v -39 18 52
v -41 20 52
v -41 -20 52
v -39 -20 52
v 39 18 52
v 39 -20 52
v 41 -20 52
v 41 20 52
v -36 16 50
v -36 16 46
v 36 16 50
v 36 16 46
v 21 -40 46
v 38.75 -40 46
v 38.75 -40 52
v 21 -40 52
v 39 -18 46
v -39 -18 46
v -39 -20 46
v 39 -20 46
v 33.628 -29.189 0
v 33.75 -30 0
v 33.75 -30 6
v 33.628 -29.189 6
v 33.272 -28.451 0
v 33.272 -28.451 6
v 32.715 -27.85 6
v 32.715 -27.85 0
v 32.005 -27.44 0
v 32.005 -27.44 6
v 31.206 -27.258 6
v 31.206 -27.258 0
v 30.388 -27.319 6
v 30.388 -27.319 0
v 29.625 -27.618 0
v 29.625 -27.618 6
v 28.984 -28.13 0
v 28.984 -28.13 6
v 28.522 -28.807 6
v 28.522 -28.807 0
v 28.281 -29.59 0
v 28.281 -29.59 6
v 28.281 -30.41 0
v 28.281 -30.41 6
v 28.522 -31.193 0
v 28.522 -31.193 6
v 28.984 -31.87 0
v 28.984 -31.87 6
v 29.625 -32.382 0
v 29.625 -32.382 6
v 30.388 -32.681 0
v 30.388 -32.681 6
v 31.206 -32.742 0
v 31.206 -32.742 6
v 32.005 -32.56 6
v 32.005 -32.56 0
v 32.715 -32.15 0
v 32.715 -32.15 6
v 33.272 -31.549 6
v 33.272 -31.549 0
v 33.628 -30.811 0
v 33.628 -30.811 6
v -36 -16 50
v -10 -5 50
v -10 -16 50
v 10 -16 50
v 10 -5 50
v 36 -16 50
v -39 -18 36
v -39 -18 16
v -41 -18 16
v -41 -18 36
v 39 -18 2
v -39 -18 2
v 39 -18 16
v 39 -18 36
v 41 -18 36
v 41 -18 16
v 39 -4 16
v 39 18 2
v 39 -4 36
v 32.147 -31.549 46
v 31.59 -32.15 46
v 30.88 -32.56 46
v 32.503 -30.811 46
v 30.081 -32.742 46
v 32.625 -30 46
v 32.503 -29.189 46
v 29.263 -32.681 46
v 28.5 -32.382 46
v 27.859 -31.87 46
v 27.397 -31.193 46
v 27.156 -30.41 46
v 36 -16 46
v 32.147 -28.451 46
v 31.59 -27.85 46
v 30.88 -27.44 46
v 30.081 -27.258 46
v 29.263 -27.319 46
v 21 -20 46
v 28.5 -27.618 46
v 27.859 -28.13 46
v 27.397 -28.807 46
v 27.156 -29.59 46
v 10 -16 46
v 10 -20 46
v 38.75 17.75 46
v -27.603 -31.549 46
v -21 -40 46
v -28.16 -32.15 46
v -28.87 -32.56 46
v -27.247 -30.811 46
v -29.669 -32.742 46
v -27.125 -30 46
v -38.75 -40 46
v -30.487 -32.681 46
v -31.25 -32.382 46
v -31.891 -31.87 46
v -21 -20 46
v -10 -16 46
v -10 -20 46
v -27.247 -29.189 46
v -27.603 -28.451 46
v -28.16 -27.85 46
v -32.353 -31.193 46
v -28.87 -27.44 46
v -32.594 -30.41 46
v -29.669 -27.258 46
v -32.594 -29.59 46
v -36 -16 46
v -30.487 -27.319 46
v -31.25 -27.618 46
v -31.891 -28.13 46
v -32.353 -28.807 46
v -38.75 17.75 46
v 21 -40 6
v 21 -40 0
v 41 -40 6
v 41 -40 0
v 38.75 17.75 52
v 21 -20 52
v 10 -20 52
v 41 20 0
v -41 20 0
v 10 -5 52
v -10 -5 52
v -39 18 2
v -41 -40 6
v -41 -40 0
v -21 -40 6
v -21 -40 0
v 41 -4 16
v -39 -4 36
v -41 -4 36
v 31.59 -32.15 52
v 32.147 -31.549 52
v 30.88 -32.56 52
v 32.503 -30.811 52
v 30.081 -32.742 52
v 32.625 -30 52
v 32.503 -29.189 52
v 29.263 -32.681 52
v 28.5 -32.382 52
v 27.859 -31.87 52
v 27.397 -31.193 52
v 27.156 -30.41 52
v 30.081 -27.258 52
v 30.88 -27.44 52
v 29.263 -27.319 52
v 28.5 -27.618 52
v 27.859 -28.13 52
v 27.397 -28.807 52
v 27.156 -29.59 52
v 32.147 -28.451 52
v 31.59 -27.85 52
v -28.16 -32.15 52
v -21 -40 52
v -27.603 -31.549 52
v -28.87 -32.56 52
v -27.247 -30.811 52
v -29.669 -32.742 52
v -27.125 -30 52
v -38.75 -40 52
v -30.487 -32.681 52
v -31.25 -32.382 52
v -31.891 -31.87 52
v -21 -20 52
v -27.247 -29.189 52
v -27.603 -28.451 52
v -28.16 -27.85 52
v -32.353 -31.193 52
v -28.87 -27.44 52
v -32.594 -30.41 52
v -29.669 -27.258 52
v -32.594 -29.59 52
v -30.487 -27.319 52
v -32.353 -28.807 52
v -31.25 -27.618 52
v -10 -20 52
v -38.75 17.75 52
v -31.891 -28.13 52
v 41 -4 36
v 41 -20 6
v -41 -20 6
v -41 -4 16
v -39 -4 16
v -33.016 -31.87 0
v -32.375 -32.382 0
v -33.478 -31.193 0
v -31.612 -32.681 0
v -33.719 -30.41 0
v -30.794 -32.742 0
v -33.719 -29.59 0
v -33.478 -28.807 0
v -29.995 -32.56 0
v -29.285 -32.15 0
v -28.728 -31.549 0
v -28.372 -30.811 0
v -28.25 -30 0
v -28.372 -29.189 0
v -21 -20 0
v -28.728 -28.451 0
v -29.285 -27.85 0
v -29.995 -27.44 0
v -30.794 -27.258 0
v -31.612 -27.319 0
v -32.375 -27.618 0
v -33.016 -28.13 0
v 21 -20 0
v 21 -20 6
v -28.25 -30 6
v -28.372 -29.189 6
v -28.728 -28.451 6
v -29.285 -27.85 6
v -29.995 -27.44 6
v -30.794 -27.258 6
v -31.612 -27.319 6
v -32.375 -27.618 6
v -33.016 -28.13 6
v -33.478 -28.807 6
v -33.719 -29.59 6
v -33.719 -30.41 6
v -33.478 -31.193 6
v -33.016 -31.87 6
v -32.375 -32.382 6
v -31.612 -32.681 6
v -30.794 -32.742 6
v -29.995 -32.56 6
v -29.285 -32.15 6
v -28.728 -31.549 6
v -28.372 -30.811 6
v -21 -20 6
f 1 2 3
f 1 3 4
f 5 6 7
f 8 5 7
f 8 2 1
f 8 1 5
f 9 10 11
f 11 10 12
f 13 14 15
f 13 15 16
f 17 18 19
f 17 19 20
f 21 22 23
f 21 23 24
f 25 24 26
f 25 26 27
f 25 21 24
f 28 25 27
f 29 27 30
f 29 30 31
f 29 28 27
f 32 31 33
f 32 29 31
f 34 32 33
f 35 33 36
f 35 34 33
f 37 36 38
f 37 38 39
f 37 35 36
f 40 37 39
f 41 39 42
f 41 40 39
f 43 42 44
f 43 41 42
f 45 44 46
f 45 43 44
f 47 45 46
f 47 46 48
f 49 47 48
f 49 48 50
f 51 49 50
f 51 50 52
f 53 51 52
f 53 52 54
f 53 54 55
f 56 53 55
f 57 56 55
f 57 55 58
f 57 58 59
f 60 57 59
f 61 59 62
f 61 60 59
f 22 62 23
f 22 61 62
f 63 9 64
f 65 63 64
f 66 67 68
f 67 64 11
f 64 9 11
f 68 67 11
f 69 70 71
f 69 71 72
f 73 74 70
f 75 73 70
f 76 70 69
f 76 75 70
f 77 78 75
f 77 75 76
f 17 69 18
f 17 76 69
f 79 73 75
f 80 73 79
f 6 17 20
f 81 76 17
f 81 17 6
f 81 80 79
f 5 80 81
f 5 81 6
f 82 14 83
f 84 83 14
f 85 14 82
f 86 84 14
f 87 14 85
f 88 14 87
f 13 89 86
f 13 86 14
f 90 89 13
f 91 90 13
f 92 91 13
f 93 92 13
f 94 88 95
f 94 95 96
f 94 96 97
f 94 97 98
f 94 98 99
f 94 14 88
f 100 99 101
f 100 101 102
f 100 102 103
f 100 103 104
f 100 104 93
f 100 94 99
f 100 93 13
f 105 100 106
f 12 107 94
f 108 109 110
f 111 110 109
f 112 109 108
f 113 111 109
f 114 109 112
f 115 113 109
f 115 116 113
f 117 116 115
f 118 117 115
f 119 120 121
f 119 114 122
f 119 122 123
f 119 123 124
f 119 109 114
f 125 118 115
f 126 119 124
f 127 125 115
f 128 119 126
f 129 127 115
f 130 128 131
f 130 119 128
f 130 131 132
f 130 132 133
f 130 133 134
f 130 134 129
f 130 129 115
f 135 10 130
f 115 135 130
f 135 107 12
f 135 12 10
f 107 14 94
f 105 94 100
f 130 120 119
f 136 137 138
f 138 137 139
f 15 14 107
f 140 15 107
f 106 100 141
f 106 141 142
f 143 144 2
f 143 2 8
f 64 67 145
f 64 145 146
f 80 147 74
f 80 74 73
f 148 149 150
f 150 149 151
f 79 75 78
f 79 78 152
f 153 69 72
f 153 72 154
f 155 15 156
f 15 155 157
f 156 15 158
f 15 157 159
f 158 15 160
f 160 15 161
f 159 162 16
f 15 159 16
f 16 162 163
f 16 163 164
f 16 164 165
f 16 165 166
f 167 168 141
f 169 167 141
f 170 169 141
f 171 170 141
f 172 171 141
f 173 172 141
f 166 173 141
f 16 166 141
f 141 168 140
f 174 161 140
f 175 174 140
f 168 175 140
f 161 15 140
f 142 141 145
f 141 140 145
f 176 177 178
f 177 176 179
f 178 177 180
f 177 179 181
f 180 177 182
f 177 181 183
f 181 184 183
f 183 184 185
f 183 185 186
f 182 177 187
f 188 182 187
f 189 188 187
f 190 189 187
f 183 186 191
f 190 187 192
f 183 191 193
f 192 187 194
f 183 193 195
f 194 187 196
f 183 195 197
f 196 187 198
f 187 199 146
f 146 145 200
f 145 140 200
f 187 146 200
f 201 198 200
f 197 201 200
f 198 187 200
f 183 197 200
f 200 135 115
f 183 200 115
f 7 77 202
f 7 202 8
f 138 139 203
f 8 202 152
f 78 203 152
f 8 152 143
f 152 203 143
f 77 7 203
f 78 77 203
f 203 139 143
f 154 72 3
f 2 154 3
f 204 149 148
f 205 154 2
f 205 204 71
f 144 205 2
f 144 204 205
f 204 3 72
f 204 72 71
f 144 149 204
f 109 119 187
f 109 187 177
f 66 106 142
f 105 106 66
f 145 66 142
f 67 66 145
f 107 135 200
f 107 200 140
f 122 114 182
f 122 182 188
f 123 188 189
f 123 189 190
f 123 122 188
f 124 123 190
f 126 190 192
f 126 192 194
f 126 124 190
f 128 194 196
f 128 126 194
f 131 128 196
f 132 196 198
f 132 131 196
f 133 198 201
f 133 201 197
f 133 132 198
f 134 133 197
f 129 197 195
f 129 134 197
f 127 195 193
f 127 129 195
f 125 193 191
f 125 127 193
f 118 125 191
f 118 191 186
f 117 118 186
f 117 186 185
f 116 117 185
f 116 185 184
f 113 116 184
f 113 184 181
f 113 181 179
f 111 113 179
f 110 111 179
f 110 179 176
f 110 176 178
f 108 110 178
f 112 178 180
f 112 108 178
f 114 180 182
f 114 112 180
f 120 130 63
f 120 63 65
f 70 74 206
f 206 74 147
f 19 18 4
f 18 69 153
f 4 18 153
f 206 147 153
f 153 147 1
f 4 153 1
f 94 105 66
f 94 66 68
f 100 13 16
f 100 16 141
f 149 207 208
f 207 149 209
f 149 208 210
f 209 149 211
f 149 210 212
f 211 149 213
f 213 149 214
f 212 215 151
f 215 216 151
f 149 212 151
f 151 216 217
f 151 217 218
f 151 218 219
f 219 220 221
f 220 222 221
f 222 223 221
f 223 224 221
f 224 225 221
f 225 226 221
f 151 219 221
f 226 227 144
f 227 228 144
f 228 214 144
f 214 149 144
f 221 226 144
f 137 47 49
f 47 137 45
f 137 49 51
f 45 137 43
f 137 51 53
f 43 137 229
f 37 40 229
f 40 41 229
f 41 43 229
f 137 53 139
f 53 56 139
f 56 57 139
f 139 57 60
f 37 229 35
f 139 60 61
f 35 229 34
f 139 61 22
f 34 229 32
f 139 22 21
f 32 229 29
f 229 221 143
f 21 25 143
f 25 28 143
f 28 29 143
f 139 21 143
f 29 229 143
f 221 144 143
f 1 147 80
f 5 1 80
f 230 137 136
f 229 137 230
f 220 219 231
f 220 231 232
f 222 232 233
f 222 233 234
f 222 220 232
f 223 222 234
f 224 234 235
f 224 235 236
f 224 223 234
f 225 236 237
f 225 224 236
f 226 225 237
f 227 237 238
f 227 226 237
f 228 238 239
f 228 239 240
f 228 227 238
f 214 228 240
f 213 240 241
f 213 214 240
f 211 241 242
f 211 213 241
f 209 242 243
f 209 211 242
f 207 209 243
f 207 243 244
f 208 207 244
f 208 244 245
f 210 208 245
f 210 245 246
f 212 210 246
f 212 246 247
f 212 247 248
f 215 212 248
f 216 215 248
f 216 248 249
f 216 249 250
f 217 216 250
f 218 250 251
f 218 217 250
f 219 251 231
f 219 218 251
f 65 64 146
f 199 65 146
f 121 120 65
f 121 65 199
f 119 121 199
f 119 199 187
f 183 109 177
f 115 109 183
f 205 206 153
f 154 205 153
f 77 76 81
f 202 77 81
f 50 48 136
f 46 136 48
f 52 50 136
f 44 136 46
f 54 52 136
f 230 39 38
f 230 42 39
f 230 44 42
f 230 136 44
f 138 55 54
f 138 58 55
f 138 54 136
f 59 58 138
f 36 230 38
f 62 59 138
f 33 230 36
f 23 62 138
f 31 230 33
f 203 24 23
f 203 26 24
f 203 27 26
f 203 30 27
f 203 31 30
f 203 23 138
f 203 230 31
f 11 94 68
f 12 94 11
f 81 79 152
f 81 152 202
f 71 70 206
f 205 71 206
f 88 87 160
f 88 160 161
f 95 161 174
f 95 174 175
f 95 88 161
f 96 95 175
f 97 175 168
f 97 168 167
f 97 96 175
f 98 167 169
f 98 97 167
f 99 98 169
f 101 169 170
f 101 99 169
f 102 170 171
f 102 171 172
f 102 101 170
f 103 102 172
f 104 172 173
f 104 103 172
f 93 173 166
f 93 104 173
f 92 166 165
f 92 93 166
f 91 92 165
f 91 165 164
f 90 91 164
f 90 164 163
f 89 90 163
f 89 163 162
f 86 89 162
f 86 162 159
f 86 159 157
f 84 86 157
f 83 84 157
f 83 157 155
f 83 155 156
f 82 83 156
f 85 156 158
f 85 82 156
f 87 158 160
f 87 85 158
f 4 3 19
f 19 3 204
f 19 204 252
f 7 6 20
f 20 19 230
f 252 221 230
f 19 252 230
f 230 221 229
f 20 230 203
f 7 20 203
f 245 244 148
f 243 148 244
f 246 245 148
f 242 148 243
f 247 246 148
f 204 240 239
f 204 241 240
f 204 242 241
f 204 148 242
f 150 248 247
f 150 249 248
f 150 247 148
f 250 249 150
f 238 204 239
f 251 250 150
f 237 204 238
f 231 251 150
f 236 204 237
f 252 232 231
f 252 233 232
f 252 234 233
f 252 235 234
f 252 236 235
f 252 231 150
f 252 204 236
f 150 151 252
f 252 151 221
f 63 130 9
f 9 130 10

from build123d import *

# Parameters (mm, degrees)
SKETCH_W          = 82
SKETCH_H          = 40
PAD_DEPTH         = 52
THICKNESS_T       = -2
SKETCH001_W       = 20
SKETCH001_H       = 20
SKETCH001_R       = 2.75
PAD001_DEPTH      = 6
SKETCH002_W       = 14
SKETCH002_H       = 20
POCKET_DEPTH      = 41.001
POCKET_DEPTH_BACK = 41.001
SKETCH003_W       = 78
SKETCH003_H       = 10
POCKET001_DEPTH   = 40.001
SKETCH004_R       = 2.75
PAD002_DEPTH      = 6
SKETCH005_W       = 72
SKETCH005_H       = 32
POCKET002_DEPTH   = 4


with BuildPart() as box:
    # Sketch → Pad (new body)
    with BuildSketch(Plane.XY):
        Rectangle(SKETCH_W, SKETCH_H)
    extrude(amount=PAD_DEPTH)

    # Thickness
    thickness_openings = [box.faces().sort_by_distance(p)[0] for p in [
        (0, 0, 52),
    ]]
    offset(amount=THICKNESS_T, openings=thickness_openings, kind=Kind.INTERSECTION)

    # Sketch001 → Pad001 (join)
    with BuildSketch(Plane.XY):
        with Locations((-31, -30)):
            Rectangle(SKETCH001_W, SKETCH001_H)
        with Locations((-31, -30)):
            Circle(SKETCH001_R, mode=Mode.SUBTRACT)
        with Locations((31, -30)):
            Rectangle(SKETCH001_W, SKETCH001_H)
        with Locations((31, -30)):
            Circle(SKETCH001_R, mode=Mode.SUBTRACT)
    extrude(amount=PAD001_DEPTH)

    # Sketch002 → Pocket (cut, two sides)
    with BuildSketch(Plane.YZ) as pocket_sk:
        with Locations((-11, 26)):
            Rectangle(SKETCH002_W, SKETCH002_H)
    extrude(amount=-POCKET_DEPTH, mode=Mode.SUBTRACT)
    extrude(pocket_sk.sketch, amount=POCKET_DEPTH_BACK, mode=Mode.SUBTRACT)

    # Sketch003 → Pocket001 (cut, through all)
    with BuildSketch(Plane.XZ):
        with Locations((0, 51)):
            Rectangle(SKETCH003_W, SKETCH003_H)
    extrude(amount=POCKET001_DEPTH, mode=Mode.SUBTRACT)


with BuildPart() as lid:
    # Sketch004 → Pad002 (new body)
    with BuildSketch(Plane.XY):
        Polygon((-38.75, 17.75), (38.75, 17.75), (38.75, -17.75), (38.75, -40), (21, -40), (21, -20), (10, -20), (10, -5), (-10, -5), (-10, -20), (-21, -20), (-21, -40), (-38.75, -40), (-38.75, -17.75), align=None)
        with Locations((-29.875, -30)):
            Circle(SKETCH004_R, mode=Mode.SUBTRACT)
        with Locations((29.875, -30)):
            Circle(SKETCH004_R, mode=Mode.SUBTRACT)
    extrude(amount=PAD002_DEPTH)

    # Sketch005 → Pocket002 (cut)
    with BuildSketch(Plane.XY):
        Rectangle(SKETCH005_W, SKETCH005_H)
    extrude(amount=POCKET002_DEPTH, mode=Mode.SUBTRACT)


with BuildPart() as lid_1:
    # Body001 placement: moved
    add(lid.part.moved(Location((0, 0, 46))))


solid = Compound([box.part, lid_1.part])
